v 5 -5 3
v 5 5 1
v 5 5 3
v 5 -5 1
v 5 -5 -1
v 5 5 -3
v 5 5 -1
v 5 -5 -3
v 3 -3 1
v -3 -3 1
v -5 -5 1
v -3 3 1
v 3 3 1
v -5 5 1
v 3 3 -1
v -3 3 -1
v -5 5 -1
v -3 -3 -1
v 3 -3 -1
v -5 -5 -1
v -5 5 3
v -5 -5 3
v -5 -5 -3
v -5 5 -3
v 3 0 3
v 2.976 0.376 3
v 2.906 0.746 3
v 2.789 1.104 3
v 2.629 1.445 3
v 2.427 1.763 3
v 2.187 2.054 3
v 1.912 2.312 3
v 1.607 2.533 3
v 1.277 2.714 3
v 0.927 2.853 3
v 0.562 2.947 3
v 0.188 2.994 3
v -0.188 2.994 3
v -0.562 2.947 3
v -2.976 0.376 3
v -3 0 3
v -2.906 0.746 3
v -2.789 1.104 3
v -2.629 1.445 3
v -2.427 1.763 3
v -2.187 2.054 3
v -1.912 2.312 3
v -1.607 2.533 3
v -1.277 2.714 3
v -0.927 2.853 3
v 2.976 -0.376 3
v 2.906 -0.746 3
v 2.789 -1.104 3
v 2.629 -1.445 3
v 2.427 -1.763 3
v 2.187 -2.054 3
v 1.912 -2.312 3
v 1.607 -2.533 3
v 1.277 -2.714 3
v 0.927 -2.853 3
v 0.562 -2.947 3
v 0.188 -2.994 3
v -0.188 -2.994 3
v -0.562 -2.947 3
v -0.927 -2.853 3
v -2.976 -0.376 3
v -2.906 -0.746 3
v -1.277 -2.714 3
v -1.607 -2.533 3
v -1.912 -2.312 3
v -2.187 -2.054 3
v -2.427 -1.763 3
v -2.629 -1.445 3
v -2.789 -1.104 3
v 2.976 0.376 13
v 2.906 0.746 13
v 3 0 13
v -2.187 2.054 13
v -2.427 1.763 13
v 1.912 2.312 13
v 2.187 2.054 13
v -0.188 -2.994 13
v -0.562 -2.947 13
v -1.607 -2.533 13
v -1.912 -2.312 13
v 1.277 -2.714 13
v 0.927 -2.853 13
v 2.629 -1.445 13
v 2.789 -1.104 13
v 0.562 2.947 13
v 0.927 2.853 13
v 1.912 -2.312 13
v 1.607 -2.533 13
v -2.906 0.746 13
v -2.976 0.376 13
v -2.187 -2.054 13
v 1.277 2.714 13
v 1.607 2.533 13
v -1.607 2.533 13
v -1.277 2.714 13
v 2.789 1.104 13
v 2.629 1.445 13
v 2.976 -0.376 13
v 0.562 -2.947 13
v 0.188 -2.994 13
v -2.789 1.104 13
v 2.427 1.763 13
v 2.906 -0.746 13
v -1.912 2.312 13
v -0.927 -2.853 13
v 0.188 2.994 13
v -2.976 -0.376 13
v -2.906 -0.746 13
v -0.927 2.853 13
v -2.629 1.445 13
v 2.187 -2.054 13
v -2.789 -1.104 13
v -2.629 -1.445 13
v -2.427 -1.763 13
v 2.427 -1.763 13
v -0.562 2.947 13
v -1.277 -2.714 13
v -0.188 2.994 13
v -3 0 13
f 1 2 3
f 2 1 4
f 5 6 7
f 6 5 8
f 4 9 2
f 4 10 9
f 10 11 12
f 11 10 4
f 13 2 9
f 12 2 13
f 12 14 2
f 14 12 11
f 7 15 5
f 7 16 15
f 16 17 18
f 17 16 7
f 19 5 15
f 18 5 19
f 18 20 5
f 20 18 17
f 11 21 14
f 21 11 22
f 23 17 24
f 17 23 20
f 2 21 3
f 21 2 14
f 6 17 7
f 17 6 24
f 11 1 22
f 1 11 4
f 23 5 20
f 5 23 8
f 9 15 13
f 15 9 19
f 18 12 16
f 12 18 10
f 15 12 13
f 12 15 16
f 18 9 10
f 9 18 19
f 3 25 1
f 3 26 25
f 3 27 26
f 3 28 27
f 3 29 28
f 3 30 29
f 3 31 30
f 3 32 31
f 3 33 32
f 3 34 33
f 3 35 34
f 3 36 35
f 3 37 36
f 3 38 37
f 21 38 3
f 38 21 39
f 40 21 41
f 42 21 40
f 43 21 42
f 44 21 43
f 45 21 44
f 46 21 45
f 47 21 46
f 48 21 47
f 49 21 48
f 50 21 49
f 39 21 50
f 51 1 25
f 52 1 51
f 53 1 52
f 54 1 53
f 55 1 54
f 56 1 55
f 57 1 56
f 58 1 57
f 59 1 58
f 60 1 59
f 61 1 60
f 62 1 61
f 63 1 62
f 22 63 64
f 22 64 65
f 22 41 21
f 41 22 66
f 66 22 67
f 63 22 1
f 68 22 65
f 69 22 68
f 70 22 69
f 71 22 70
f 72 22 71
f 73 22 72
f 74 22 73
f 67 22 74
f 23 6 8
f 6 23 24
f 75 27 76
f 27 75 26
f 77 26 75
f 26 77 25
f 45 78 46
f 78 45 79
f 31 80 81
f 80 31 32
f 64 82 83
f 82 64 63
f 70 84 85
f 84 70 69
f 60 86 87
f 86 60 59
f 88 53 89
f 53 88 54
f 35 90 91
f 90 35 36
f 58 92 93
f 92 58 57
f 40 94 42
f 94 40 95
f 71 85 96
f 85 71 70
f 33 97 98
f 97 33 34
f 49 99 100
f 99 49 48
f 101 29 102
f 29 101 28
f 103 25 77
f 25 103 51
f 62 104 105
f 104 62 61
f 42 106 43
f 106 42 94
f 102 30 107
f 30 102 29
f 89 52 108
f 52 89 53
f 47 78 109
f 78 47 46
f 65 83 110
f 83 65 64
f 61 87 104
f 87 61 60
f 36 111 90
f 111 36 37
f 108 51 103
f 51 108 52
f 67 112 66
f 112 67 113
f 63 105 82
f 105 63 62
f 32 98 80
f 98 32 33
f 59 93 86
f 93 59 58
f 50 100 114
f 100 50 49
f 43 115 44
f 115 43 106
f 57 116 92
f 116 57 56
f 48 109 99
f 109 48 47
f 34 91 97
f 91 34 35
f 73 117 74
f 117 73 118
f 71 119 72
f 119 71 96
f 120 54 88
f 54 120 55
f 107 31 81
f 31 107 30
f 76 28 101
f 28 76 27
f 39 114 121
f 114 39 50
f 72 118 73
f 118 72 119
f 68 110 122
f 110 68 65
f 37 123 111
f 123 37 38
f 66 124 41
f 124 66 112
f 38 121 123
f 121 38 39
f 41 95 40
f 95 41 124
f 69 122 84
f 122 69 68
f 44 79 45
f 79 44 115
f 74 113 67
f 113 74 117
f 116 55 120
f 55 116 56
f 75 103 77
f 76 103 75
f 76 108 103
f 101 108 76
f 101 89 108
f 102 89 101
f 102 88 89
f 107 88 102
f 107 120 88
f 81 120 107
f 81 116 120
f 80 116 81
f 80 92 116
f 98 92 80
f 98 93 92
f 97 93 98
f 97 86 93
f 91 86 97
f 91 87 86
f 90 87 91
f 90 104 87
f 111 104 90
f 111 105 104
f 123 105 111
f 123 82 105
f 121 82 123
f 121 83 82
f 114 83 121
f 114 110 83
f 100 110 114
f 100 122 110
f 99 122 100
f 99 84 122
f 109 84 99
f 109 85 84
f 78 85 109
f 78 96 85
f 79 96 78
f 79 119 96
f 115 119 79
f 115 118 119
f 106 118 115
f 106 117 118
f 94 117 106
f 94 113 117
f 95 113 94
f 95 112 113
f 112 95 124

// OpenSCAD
diam = 6;
length = 10;

Holder = 10;
Thick = 6;
rim = 4;
rimHeight = 2;

$fn = 50;

union() {
    difference() {
        cube([Holder, Holder, Thick], center = true);
        
        translate([0, 0, 0])
            difference() {
                cube([Holder, Holder, rimHeight], center = true);
                cube([Holder - rim, Holder - rim, rimHeight], center = true);            
            }
    }
    
    translate([0, 0, Thick / 2 + length / 2])
        rotate([0, 0, 0])
            cylinder(d = diam, h=length, center = true);
}
